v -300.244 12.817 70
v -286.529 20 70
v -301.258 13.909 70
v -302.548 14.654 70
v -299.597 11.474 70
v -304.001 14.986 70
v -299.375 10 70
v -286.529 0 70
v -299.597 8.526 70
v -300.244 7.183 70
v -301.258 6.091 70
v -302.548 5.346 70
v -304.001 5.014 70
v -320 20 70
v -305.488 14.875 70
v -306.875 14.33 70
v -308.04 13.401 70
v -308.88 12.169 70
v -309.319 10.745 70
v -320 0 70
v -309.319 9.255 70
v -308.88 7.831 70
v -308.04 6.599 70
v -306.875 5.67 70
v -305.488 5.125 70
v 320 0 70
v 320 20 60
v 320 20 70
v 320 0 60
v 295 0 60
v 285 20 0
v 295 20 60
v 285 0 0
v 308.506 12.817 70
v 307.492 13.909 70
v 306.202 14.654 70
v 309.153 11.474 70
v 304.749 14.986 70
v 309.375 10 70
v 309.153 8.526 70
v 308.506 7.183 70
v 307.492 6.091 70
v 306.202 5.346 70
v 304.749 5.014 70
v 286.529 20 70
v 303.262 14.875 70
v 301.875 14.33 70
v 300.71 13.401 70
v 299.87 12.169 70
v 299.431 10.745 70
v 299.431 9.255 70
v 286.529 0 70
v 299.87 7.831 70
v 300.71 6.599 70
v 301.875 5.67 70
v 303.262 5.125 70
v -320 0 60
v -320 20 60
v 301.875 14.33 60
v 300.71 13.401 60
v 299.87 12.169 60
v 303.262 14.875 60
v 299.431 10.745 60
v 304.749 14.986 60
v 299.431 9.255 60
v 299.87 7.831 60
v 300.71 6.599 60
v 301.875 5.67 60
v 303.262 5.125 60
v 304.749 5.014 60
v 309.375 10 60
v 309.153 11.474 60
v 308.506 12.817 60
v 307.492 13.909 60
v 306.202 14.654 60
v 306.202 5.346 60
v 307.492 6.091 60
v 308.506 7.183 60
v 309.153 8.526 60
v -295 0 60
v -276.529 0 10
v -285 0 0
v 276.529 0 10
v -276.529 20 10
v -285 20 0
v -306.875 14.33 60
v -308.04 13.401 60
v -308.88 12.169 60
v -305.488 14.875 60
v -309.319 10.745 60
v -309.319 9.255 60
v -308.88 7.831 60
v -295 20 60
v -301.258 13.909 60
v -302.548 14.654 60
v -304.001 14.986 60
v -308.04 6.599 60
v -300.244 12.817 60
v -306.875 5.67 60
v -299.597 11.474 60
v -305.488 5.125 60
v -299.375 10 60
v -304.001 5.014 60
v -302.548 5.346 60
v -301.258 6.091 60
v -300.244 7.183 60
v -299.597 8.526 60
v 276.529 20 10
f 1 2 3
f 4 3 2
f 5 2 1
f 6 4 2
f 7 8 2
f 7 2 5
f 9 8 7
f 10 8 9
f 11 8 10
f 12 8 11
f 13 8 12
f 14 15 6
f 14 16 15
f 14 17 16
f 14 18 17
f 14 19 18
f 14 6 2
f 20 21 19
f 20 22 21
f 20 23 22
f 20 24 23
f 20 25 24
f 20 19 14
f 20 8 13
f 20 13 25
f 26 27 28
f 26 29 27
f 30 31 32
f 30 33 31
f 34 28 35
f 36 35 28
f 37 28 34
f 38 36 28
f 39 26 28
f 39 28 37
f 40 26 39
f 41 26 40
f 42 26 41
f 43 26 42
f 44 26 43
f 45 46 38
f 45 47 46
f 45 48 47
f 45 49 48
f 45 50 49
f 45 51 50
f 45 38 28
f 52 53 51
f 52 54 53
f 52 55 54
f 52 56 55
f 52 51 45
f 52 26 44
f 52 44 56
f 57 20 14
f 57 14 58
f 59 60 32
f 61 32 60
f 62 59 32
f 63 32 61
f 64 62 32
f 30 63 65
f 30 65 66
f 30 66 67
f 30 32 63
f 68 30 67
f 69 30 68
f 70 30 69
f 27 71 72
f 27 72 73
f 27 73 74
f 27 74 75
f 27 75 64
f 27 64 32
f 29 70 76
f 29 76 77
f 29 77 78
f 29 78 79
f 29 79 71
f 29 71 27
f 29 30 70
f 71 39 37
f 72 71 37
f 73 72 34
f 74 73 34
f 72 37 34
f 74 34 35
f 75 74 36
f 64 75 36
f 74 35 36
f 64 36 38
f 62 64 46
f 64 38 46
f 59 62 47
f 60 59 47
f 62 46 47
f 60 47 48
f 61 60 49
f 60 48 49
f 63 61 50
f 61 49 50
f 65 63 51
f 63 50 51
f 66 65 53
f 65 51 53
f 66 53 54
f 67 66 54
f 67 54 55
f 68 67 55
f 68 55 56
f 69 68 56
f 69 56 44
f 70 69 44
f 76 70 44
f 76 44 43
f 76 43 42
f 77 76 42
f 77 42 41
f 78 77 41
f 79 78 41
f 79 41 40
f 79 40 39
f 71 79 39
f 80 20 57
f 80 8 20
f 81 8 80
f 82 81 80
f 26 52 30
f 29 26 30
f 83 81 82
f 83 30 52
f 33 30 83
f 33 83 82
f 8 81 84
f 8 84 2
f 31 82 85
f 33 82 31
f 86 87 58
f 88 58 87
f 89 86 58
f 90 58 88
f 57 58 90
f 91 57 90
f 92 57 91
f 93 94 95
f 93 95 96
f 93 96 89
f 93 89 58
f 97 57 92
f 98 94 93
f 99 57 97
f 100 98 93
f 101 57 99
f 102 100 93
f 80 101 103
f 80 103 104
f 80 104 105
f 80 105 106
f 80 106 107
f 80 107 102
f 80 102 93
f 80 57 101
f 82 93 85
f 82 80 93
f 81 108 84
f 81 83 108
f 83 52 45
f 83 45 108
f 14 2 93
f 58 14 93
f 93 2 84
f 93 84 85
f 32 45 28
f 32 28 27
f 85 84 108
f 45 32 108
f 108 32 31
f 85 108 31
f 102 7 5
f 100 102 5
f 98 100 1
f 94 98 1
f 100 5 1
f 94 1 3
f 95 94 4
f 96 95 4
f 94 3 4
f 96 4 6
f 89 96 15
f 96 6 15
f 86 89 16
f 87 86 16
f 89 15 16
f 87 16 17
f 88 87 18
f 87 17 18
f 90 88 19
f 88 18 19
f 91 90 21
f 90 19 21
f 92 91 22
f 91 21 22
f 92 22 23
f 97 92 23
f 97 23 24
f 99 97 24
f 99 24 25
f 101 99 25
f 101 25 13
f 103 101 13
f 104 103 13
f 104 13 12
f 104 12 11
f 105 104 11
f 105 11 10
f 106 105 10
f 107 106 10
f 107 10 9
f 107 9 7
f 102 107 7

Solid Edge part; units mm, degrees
sketch "Sketch1" plane through (0, 0, 0) normal (0, -1, 0) x (1, 0, 0)
  line L0 (285, 0) -> (295, 60)
  line L1 (295, 60) -> (320, 60)
  line L2 (320, 60) -> (320, 70)
  line L3 (320, 70) -> (286.5287, 70)
  line L4 (286.5287, 70) -> (276.5287, 10)
  line L5 (276.5287, 10) -> (0, 10)
  line L6 (0, 10) -> (0, 0)
  line L7 (0, 0) -> (285, 0)
  dimension "D1" = 10
  dimension "D2" = 10
  dimension "D3" = 10
  dimension "D4" = 60
  dimension "D5" = 10
  dimension "D6" = 25
  dimension "D7" = 320
extrude "Protrusion1" add sketch "Sketch1" against normal blind 20
mirror "Mirror1" about plane through (0, 0, 0) normal (1, 0, 0) of "Protrusion1"
sketch "Sketch2" plane through (287.9289, 10, 70) normal (0, 0, 1) x (1, 0, 0)
  circle A0 centre (-592.3039, 0) radius 5
  circle A1 centre (16.4461, 0) radius 5
  dimension "D1" = 608.75
  dimension "D2" = 304.375
extrude "ExtrudedCutout_1" cut sketch "Sketch2" against normal blind 35.7617 and the other way blind 15.9026
